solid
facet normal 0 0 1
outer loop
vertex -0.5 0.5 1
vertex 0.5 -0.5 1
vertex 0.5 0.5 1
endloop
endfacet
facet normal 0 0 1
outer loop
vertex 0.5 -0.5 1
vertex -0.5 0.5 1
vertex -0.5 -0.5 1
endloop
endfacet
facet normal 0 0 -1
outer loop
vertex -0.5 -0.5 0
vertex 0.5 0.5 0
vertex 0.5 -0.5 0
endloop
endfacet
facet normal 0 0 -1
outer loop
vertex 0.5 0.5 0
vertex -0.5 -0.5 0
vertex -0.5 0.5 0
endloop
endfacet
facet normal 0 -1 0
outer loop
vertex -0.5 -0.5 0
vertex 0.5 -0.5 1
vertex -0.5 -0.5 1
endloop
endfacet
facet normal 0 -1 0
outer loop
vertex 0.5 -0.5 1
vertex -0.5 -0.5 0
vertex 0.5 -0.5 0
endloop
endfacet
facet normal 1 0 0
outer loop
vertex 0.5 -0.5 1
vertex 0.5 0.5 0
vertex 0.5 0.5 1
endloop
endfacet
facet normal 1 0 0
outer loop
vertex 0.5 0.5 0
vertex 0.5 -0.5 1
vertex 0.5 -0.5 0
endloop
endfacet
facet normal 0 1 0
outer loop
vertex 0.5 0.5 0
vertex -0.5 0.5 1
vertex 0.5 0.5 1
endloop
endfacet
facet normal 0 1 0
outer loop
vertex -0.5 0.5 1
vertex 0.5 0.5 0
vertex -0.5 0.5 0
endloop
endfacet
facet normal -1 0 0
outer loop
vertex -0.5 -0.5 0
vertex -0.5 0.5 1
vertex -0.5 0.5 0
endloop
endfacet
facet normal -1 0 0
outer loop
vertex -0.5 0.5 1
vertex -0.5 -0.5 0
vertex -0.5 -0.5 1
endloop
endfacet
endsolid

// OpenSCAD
// Cube for Stacks of Shapes
// by Slashee the Cow

translate([0,0,0.5])
    cube(1, center = true);
